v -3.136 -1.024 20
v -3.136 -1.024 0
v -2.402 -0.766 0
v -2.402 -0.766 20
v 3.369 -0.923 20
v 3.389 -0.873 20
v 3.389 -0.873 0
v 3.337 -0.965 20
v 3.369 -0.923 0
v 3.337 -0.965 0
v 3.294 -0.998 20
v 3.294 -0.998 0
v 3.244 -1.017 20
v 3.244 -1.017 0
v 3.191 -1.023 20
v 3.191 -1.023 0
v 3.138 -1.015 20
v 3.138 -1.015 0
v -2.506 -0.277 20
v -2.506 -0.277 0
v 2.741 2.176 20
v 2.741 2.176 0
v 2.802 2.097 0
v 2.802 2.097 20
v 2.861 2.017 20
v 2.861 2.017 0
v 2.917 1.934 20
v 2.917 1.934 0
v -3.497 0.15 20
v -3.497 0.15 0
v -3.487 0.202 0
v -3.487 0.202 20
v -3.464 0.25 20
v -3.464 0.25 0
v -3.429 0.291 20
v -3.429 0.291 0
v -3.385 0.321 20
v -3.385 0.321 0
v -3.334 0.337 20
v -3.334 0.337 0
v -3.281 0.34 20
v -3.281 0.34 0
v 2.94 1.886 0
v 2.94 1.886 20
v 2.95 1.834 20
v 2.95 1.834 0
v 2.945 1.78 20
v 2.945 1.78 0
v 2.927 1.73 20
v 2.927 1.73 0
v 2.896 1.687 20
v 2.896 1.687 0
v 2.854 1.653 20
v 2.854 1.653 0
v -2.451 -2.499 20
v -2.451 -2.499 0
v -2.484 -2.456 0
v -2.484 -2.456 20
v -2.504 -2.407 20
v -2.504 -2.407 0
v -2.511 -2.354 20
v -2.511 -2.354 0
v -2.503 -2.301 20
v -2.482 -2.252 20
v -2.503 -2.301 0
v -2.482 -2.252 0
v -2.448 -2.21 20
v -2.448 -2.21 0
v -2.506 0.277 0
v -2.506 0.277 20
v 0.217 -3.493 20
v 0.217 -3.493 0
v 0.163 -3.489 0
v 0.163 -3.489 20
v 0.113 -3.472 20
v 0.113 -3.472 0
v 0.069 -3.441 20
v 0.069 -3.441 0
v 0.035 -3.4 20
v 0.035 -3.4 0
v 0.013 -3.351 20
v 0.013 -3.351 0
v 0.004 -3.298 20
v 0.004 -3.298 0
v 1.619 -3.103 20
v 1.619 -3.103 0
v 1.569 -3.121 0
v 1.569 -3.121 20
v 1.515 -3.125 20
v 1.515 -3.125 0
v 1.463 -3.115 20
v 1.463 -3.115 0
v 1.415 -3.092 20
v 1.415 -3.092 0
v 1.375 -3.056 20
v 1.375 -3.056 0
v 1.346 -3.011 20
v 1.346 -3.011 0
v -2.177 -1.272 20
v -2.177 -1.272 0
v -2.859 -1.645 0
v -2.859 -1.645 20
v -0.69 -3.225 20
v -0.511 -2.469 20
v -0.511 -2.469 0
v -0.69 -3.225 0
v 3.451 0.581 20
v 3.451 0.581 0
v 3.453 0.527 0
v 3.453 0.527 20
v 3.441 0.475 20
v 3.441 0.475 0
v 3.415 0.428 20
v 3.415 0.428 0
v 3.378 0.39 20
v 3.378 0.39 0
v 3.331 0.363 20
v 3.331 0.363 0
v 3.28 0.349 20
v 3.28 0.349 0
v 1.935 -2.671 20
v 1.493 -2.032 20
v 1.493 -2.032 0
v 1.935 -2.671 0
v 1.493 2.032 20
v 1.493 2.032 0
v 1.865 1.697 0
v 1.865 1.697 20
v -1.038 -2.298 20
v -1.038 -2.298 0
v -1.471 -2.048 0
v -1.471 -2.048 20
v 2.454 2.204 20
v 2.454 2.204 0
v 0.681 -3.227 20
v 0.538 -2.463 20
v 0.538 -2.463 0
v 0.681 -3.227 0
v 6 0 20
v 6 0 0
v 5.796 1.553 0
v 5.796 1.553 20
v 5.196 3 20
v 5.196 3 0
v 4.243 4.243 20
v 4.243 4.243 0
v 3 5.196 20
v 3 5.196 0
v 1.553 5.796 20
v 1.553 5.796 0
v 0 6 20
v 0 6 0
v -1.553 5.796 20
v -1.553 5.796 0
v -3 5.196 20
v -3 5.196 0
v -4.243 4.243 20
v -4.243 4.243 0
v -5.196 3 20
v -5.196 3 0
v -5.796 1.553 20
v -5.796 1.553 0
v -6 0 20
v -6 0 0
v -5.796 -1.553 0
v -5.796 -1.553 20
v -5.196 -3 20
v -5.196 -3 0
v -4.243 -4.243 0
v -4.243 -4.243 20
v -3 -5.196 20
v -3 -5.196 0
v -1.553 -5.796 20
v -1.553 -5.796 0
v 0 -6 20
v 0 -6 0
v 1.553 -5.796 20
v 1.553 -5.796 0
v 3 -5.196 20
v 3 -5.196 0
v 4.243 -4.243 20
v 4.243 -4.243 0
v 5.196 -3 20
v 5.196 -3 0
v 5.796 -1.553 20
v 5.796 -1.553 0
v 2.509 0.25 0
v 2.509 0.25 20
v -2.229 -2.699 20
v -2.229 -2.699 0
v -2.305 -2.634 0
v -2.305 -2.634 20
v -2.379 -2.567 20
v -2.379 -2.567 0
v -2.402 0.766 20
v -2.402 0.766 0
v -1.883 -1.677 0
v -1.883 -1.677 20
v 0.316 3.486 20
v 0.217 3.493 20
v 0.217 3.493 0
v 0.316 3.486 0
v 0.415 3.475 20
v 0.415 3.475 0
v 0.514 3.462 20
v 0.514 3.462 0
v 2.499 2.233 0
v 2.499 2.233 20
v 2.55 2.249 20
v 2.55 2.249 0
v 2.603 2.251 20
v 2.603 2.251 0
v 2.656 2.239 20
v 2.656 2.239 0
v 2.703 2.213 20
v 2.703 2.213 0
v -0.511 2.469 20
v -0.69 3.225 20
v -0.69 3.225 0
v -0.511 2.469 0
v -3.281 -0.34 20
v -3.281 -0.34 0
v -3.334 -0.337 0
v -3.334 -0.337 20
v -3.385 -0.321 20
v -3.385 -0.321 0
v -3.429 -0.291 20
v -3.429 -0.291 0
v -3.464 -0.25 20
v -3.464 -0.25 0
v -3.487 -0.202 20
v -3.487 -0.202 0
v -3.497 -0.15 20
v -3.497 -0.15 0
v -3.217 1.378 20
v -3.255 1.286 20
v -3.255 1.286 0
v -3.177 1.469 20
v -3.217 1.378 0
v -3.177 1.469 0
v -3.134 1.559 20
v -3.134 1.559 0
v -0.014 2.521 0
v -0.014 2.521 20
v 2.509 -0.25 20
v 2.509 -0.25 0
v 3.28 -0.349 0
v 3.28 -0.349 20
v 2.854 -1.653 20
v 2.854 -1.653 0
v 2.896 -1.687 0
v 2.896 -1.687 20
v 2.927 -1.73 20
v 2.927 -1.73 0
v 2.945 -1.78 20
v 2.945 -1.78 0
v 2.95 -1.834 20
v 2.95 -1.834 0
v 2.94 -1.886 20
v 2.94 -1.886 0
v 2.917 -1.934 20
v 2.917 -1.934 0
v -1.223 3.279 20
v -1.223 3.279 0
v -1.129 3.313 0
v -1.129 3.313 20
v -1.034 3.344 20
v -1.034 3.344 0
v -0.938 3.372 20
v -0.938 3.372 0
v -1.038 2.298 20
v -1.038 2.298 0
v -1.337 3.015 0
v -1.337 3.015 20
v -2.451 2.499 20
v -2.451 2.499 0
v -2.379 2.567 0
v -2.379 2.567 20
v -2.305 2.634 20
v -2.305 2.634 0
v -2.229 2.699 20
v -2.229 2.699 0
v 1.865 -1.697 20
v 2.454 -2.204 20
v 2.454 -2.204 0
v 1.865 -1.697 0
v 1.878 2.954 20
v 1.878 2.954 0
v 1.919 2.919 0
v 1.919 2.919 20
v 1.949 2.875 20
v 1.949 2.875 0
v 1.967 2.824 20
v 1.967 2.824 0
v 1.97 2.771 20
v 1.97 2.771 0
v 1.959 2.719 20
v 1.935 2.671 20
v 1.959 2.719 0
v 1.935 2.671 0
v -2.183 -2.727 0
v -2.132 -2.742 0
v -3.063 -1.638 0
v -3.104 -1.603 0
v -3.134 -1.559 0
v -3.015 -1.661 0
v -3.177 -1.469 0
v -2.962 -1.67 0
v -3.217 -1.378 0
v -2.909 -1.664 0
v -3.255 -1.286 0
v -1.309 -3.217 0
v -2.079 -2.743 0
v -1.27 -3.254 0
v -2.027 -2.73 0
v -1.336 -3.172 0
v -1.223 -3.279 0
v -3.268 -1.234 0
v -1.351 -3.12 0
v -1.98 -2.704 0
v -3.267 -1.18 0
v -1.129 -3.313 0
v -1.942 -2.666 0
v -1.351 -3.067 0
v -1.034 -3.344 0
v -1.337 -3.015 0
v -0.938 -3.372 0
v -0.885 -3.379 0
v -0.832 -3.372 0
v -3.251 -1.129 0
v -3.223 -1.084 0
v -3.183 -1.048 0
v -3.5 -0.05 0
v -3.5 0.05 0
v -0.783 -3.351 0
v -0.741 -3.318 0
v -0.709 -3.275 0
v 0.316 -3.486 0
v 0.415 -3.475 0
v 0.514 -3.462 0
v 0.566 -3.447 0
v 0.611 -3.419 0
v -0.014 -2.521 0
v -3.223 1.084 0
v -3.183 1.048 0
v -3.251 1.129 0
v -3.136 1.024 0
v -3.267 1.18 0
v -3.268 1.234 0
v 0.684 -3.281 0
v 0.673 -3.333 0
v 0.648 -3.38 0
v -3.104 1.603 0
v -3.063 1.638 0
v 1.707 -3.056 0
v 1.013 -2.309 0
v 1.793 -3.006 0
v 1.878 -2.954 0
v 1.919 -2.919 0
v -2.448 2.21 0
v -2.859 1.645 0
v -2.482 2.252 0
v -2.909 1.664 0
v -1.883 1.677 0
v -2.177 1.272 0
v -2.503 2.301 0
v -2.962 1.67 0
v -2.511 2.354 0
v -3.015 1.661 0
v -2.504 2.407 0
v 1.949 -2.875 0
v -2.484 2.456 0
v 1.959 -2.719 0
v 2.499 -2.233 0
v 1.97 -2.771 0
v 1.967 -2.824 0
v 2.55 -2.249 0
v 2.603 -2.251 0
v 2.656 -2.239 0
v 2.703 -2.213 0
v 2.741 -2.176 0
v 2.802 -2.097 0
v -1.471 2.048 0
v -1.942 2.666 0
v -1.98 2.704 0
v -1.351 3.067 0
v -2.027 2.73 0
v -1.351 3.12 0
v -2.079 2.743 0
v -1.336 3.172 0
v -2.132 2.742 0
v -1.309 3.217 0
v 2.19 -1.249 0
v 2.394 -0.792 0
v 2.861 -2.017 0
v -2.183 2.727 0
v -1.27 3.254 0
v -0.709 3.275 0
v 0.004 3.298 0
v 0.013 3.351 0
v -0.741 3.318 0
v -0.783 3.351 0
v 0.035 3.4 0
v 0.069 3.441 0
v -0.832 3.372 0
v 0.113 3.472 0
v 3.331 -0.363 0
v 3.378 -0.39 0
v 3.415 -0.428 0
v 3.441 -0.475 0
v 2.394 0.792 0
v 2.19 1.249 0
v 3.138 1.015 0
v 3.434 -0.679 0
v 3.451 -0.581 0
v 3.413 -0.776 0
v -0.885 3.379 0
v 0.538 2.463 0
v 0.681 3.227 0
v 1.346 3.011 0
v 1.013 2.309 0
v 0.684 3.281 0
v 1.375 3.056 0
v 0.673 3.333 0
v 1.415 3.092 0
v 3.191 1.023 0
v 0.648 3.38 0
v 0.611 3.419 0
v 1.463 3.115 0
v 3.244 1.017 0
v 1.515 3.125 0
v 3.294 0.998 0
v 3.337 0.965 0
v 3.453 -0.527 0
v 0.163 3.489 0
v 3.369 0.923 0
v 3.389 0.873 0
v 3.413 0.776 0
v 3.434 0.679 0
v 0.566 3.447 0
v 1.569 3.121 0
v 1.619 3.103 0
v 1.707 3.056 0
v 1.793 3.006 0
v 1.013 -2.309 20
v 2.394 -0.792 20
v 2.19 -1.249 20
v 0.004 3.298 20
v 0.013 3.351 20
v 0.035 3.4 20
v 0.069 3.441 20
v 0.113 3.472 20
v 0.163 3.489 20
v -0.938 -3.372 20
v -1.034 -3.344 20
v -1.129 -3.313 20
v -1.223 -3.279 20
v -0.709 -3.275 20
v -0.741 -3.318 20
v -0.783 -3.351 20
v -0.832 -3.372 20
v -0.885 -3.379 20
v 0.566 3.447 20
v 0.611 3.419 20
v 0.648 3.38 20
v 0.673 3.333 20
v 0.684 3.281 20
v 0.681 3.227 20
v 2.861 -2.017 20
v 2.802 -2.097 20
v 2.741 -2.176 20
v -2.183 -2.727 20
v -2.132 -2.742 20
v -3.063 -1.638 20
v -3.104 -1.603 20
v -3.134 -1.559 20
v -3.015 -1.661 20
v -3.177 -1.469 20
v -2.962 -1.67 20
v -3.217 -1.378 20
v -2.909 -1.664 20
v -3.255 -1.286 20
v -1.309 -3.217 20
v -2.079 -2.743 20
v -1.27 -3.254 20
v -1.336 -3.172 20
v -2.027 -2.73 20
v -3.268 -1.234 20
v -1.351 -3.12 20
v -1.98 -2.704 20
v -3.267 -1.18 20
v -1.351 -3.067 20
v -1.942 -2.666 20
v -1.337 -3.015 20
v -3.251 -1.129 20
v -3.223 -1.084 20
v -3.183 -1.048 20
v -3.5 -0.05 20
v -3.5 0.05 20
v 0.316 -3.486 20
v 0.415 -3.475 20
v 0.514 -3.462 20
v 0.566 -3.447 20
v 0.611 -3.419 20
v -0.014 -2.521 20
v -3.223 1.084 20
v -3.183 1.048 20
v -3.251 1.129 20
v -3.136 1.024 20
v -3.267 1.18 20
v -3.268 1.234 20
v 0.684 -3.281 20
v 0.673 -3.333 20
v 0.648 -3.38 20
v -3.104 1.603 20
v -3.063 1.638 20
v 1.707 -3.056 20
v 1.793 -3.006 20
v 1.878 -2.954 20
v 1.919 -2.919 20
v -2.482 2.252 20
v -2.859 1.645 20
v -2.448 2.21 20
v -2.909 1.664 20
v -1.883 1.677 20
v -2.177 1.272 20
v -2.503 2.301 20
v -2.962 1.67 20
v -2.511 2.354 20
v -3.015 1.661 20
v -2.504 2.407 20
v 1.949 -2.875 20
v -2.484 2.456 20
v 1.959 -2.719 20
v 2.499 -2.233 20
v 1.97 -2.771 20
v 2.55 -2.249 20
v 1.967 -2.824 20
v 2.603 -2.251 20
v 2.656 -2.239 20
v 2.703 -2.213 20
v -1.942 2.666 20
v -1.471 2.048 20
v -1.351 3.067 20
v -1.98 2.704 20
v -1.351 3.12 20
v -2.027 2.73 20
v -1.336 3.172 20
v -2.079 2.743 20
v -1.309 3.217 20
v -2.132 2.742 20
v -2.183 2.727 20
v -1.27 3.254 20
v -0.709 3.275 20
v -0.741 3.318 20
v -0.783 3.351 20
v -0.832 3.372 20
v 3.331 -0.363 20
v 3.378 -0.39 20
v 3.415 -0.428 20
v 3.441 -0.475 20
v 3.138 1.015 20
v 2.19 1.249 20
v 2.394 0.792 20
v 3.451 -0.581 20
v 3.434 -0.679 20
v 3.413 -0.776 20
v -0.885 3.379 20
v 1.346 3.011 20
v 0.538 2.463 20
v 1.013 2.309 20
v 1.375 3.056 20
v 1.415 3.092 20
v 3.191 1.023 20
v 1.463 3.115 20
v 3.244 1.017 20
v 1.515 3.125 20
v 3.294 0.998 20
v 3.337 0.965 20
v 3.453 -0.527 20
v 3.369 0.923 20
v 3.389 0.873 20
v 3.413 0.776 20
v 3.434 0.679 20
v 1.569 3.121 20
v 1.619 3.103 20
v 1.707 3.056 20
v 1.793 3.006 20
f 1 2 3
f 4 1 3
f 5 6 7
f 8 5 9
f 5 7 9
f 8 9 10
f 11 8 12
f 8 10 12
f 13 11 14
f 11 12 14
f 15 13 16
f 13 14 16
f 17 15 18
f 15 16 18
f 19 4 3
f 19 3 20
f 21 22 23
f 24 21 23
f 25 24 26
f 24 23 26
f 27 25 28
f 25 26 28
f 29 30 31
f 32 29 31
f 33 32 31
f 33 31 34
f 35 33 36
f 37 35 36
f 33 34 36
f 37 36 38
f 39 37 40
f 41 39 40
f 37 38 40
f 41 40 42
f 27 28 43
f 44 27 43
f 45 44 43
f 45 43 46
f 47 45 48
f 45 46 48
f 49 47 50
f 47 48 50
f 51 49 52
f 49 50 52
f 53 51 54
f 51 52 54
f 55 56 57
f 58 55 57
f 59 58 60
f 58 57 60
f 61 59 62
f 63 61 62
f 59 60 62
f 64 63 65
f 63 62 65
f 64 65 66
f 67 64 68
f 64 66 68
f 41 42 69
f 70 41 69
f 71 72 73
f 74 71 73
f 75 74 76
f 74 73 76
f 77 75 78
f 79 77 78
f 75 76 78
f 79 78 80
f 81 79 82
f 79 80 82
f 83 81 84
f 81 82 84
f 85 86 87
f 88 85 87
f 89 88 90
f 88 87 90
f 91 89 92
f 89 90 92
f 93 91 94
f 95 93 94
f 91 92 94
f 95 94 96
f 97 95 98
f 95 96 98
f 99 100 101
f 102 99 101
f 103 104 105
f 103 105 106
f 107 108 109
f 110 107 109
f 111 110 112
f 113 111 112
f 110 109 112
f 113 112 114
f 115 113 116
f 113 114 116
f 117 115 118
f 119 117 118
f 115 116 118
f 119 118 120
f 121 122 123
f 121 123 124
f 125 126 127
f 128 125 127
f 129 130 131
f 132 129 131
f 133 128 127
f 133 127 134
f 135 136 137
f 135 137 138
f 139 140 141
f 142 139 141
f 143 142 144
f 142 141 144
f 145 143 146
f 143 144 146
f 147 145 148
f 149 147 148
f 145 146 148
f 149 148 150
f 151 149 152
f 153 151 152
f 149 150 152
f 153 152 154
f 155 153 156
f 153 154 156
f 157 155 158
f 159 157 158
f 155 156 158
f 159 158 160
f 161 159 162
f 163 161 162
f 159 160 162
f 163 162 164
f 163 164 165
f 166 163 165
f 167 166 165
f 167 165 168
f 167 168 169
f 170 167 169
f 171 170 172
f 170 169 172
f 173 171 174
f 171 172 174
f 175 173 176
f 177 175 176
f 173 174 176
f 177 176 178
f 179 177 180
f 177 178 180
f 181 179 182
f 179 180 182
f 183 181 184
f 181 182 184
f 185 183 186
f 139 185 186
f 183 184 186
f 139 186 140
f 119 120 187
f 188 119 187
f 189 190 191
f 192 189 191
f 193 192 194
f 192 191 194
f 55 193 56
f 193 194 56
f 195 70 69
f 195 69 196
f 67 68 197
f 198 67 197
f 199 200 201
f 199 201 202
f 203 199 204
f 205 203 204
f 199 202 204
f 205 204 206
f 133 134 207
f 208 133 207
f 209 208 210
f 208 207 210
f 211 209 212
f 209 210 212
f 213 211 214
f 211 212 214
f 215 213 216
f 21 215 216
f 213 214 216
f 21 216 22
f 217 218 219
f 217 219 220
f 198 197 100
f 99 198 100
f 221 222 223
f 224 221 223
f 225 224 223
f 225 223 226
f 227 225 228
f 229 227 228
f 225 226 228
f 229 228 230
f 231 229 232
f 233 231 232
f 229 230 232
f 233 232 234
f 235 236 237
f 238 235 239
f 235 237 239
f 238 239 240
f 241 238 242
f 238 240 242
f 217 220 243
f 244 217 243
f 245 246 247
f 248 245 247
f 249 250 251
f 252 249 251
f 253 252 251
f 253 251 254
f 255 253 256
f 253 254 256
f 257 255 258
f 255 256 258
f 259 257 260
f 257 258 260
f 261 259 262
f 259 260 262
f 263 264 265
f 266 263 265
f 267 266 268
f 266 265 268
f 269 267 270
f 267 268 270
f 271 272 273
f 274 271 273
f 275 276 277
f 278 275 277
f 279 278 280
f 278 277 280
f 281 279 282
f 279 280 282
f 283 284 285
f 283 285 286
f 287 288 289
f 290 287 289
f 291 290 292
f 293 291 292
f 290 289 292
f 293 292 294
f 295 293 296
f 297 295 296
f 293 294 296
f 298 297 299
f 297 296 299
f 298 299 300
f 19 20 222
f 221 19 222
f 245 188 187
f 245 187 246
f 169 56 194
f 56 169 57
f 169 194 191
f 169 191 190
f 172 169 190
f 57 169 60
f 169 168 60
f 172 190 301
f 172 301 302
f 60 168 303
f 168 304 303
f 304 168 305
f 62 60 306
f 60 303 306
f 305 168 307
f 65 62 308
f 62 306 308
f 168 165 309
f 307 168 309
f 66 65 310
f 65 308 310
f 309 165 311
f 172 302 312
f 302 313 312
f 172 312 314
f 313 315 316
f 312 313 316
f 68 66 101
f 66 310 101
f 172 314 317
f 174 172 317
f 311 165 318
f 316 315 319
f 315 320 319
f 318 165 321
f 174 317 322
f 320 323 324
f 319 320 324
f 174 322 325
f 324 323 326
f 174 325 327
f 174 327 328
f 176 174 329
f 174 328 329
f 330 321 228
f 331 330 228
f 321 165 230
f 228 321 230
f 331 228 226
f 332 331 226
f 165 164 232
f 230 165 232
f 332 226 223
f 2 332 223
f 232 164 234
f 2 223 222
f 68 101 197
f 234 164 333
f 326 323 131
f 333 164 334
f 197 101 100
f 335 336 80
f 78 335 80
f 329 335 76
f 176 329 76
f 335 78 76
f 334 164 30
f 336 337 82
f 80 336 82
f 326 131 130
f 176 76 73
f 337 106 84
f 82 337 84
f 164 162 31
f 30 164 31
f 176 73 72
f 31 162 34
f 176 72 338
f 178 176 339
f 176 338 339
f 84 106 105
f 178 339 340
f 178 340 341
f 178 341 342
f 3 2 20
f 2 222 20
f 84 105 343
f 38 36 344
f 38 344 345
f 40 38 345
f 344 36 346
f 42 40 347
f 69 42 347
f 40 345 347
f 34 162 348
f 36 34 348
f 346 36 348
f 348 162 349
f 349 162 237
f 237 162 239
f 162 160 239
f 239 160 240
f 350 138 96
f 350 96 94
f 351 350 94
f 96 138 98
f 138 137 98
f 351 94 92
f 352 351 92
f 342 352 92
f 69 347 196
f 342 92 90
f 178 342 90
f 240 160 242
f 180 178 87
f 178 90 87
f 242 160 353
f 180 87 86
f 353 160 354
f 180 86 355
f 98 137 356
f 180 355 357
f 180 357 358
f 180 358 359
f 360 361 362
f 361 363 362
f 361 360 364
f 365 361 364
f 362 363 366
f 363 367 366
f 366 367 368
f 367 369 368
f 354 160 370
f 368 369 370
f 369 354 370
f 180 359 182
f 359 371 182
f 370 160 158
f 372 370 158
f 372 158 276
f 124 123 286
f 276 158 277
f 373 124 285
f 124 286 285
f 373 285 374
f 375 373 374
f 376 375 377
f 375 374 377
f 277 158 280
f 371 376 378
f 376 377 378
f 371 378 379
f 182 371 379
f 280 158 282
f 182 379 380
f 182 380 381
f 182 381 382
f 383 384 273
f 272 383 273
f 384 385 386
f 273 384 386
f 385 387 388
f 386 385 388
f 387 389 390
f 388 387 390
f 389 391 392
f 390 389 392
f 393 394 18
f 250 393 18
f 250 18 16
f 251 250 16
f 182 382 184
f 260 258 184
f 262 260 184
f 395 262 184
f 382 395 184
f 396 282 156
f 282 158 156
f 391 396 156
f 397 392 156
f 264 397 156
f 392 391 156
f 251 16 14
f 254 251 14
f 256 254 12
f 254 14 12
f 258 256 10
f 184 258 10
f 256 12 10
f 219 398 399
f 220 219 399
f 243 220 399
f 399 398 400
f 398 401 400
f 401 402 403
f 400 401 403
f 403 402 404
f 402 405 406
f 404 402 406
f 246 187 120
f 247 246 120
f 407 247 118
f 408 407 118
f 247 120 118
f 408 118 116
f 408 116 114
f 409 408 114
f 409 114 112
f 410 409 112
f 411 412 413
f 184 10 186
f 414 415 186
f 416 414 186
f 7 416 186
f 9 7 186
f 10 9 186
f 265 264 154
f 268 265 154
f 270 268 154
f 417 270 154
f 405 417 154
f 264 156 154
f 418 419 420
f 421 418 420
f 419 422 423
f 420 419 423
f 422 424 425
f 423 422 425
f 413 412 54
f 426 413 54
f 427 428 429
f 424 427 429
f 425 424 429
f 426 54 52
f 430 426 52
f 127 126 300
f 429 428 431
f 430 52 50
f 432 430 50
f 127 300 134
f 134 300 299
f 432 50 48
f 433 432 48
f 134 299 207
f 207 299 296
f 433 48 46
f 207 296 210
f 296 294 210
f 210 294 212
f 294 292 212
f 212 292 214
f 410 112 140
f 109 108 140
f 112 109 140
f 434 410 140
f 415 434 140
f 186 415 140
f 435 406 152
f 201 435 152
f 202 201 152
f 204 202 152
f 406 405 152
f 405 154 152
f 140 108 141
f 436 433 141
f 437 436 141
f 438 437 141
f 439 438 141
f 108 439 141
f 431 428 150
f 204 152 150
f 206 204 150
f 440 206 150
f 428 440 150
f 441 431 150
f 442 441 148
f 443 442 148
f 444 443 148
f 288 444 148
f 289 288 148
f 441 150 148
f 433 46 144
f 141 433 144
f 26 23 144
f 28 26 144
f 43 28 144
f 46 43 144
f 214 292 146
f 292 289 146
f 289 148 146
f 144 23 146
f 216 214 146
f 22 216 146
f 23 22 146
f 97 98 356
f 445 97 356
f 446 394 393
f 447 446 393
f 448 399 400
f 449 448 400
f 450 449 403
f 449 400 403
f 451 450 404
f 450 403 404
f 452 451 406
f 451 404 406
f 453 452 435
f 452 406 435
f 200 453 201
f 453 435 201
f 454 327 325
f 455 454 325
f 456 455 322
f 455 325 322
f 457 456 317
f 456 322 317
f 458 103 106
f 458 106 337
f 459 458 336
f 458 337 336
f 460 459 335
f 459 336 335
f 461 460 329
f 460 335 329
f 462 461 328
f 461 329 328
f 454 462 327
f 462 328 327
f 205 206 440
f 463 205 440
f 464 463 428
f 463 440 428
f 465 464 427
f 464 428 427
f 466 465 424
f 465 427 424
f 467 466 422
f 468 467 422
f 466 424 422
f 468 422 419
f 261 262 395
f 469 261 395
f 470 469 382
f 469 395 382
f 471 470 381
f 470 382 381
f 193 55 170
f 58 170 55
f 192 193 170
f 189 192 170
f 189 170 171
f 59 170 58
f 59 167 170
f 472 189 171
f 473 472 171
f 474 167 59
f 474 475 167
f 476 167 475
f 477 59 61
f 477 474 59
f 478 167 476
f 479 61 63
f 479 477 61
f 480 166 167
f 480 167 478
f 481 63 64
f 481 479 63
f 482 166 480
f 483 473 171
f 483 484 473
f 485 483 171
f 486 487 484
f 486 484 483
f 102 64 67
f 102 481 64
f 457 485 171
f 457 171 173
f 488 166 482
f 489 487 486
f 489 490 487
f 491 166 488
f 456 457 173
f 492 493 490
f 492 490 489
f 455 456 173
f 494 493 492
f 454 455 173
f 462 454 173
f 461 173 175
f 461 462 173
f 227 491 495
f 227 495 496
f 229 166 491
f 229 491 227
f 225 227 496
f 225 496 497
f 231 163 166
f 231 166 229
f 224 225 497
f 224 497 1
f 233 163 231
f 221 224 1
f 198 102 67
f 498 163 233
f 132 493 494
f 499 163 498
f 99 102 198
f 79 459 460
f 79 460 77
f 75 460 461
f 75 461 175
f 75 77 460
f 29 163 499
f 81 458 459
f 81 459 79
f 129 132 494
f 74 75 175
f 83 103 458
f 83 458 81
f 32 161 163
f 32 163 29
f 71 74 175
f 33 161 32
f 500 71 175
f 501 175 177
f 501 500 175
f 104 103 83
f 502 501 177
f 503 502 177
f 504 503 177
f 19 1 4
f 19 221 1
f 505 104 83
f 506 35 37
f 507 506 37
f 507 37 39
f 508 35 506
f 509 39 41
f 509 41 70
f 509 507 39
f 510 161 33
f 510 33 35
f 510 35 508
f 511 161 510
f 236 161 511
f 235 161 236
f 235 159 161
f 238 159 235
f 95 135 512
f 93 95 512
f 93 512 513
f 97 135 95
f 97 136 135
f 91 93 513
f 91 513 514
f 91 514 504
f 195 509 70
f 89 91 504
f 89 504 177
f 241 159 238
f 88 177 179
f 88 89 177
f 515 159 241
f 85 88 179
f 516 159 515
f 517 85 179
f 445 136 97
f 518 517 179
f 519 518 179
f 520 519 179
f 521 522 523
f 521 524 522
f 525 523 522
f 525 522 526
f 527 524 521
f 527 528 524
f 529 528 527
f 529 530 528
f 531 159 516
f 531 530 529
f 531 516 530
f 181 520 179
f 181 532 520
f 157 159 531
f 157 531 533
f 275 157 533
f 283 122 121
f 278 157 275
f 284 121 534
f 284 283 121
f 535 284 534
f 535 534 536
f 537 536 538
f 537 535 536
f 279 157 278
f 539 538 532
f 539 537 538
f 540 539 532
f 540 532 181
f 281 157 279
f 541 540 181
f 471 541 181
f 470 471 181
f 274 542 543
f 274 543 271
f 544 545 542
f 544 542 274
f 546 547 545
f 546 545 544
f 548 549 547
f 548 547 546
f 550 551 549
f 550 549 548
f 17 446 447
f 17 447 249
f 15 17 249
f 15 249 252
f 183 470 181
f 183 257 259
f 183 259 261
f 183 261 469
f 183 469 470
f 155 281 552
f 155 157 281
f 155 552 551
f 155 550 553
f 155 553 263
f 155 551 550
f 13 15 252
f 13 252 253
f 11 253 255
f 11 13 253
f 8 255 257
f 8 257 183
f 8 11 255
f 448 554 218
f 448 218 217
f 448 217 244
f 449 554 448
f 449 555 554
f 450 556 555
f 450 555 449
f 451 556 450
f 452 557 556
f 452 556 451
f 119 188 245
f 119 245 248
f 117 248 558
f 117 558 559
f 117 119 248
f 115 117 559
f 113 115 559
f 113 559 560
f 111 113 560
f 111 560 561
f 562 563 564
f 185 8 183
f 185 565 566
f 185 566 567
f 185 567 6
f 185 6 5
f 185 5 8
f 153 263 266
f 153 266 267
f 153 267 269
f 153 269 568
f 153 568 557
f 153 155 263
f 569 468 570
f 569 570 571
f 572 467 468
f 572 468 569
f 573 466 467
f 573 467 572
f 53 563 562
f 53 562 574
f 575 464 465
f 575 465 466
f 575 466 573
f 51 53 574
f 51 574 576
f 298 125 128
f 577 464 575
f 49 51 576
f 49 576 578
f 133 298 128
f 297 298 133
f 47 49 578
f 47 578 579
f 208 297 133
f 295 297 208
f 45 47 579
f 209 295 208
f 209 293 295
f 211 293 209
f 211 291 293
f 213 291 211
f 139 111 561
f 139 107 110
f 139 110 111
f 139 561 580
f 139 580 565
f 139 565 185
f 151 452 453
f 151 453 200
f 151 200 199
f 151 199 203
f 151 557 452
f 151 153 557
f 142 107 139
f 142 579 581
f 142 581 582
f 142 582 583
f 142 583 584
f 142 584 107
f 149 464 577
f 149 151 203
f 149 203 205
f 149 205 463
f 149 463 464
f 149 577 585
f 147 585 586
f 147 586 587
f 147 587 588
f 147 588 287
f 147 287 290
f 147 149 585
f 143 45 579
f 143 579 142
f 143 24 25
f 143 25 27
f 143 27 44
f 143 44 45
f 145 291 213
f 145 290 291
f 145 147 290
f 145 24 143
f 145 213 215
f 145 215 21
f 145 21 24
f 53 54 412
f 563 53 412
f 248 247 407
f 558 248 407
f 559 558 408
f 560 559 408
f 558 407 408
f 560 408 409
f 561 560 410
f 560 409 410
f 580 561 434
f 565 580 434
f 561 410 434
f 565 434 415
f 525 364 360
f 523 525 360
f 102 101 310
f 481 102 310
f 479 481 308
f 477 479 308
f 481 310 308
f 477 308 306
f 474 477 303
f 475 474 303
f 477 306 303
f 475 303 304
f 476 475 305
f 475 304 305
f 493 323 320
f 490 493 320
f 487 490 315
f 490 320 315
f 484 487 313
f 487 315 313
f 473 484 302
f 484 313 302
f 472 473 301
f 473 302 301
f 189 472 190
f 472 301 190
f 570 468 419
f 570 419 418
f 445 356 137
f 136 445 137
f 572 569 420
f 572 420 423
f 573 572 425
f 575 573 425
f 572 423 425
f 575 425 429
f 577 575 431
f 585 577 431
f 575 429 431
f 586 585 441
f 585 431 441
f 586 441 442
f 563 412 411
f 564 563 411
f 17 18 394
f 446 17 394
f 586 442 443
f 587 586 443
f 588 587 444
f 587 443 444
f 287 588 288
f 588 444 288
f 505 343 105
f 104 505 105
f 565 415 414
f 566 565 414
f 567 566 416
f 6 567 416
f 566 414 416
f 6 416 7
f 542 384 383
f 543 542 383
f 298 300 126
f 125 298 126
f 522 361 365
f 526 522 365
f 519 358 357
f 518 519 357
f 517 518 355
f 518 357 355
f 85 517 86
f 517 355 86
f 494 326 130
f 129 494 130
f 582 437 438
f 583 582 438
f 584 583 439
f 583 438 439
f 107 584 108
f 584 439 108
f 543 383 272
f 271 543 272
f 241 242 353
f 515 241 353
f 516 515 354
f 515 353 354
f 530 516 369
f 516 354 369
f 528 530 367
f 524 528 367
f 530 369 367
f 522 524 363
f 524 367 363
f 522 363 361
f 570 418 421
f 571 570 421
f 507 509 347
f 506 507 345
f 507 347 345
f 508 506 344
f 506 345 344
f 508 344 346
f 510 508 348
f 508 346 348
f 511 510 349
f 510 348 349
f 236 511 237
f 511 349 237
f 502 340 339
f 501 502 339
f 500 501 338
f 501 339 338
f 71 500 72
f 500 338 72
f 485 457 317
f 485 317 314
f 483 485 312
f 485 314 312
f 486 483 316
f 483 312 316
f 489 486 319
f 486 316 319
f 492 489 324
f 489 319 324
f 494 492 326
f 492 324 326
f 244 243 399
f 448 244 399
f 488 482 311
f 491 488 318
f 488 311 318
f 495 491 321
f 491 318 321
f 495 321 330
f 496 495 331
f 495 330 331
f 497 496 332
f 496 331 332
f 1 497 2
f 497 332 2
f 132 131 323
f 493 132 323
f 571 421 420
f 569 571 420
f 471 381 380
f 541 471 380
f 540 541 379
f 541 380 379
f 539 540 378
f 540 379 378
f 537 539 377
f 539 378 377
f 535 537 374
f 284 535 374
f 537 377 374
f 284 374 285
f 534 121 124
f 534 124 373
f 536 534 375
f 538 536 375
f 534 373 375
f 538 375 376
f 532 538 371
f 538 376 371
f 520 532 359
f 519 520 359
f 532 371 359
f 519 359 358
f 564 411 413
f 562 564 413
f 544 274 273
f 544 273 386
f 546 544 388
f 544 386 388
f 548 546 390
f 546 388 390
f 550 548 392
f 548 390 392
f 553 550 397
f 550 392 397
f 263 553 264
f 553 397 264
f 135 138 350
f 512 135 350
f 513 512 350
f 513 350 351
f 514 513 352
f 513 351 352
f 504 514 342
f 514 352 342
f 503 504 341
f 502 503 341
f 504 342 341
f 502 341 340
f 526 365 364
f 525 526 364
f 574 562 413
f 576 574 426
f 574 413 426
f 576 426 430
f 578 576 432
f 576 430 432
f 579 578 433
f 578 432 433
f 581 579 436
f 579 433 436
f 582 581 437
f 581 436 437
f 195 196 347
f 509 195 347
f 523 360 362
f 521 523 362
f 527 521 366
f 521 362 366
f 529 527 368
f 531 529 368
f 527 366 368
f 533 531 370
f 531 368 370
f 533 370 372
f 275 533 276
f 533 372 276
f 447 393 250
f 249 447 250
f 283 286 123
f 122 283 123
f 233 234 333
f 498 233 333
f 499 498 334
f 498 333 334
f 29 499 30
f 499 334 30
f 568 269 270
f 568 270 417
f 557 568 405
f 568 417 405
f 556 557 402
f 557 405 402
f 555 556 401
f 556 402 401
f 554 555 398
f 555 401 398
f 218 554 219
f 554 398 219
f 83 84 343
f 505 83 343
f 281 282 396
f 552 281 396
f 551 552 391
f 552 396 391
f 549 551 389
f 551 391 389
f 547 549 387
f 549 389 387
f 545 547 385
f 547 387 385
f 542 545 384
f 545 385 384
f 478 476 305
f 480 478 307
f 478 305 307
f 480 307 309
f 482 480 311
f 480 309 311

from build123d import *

# Parameters (mm, degrees)
F0_R     = 6
F1_DEPTH = 20


with BuildPart() as f1:
    # F0 (on Top) → F1 (new body)
    with BuildSketch(Plane.XY):
        Circle(F0_R)
        with BuildLine():
            Line((3.279786, 0.349242), (2.50894, 0.25))
            Line((2.50894, 0.25), (2.50894, -0.25))
            Line((2.50894, -0.25), (3.279786, -0.349242))
            ThreePointArc((3.279786, -0.349242), (3.414903, -0.428484), (3.451475, -0.580793))
            ThreePointArc((3.451475, -0.580793), (3.423517, -0.727691), (3.389309, -0.87326))
            ThreePointArc((3.389309, -0.87326), (3.293949, -0.997527), (3.138283, -1.01496))
            Line((3.138283, -1.01496), (2.393715, -0.792091))
            Line((2.393715, -0.792091), (2.190347, -1.248864))
            Line((2.190347, -1.248864), (2.854184, -1.653058))
            ThreePointArc((2.854184, -1.653058), (2.945389, -1.780405), (2.916849, -1.934423))
            ThreePointArc((2.916849, -1.934423), (2.831559, -2.057248), (2.741101, -2.176319))
            ThreePointArc((2.741101, -2.176319), (2.603441, -2.251056), (2.454143, -2.203667))
            Line((2.454143, -2.203667), (1.864595, -1.697223))
            Line((1.864595, -1.697223), (1.493022, -2.031788))
            Line((1.493022, -2.031788), (1.935067, -2.671045))
            ThreePointArc((1.935067, -2.671045), (1.966591, -2.824479), (1.877874, -2.953572))
            ThreePointArc((1.877874, -2.953572), (1.75, -3.031089), (1.618932, -3.103073))
            ThreePointArc((1.618932, -3.103073), (1.462775, -3.115357), (1.345659, -3.01134))
            Line((1.345659, -3.01134), (1.013069, -2.308889))
            Line((1.013069, -2.308889), (0.537541, -2.463398))
            Line((0.537541, -2.463398), (0.68136, -3.227184))
            ThreePointArc((0.68136, -3.227184), (0.647751, -3.380174), (0.514197, -3.462023))
            ThreePointArc((0.514197, -3.462023), (0.36585, -3.480827), (0.216834, -3.493277))
            ThreePointArc((0.216834, -3.493277), (0.069182, -3.440984), (0.004498, -3.298325))
            Line((0.004498, -3.298325), (-0.013625, -2.521328))
            Line((-0.013625, -2.521328), (-0.510886, -2.469064))
            Line((-0.510886, -2.469064), (-0.69016, -3.225313))
            ThreePointArc((-0.69016, -3.225313), (-0.783091, -3.351407), (-0.938389, -3.371858))
            ThreePointArc((-0.938389, -3.371858), (-1.081559, -3.328698), (-1.222756, -3.279462))
            ThreePointArc((-1.222756, -3.279462), (-1.336374, -3.171634), (-1.33744, -3.014999))
            Line((-1.33744, -3.014999), (-1.037964, -2.297806))
            Line((-1.037964, -2.297806), (-1.470976, -2.047806))
            Line((-1.470976, -2.047806), (-1.942346, -2.665757))
            ThreePointArc((-1.942346, -2.665757), (-2.078529, -2.743151), (-2.228719, -2.698668))
            ThreePointArc((-2.228719, -2.698668), (-2.341957, -2.601007), (-2.45092, -2.498598))
            ThreePointArc((-2.45092, -2.498598), (-2.510858, -2.35388), (-2.448123, -2.210353))
            Line((-2.448123, -2.210353), (-1.882829, -1.676972))
            Line((-1.882829, -1.676972), (-2.176721, -1.272464))
            Line((-2.176721, -1.272464), (-2.858682, -1.645267))
            ThreePointArc((-2.858682, -1.645267), (-3.014571, -1.660579), (-3.133684, -1.558854))
            ThreePointArc((-3.133684, -1.558854), (-3.197409, -1.423578), (-3.255298, -1.285704))
            ThreePointArc((-3.255298, -1.285704), (-3.251192, -1.129119), (-3.135503, -1.023516))
            Line((-3.135503, -1.023516), (-2.402136, -0.766175))
            Line((-2.402136, -0.766175), (-2.506092, -0.277101))
            Line((-2.506092, -0.277101), (-3.280726, -0.340295))
            ThreePointArc((-3.280726, -0.340295), (-3.429366, -0.290878), (-3.496806, -0.1495))
            ThreePointArc((-3.496806, -0.1495), (-3.5, 0), (-3.496806, 0.1495))
            ThreePointArc((-3.496806, 0.1495), (-3.429366, 0.290878), (-3.280726, 0.340295))
            Line((-3.280726, 0.340295), (-2.506092, 0.277101))
            Line((-2.506092, 0.277101), (-2.402136, 0.766175))
            Line((-2.402136, 0.766175), (-3.135503, 1.023516))
            ThreePointArc((-3.135503, 1.023516), (-3.251192, 1.129119), (-3.255298, 1.285704))
            ThreePointArc((-3.255298, 1.285704), (-3.197409, 1.423578), (-3.133684, 1.558854))
            ThreePointArc((-3.133684, 1.558854), (-3.014571, 1.660579), (-2.858682, 1.645267))
            Line((-2.858682, 1.645267), (-2.176721, 1.272464))
            Line((-2.176721, 1.272464), (-1.882829, 1.676972))
            Line((-1.882829, 1.676972), (-2.448123, 2.210353))
            ThreePointArc((-2.448123, 2.210353), (-2.510858, 2.35388), (-2.45092, 2.498598))
            ThreePointArc((-2.45092, 2.498598), (-2.341957, 2.601007), (-2.228719, 2.698668))
            ThreePointArc((-2.228719, 2.698668), (-2.078529, 2.743151), (-1.942346, 2.665757))
            Line((-1.942346, 2.665757), (-1.470976, 2.047806))
            Line((-1.470976, 2.047806), (-1.037964, 2.297806))
            Line((-1.037964, 2.297806), (-1.33744, 3.014999))
            ThreePointArc((-1.33744, 3.014999), (-1.336374, 3.171634), (-1.222756, 3.279462))
            ThreePointArc((-1.222756, 3.279462), (-1.081559, 3.328698), (-0.938389, 3.371858))
            ThreePointArc((-0.938389, 3.371858), (-0.783091, 3.351407), (-0.69016, 3.225313))
            Line((-0.69016, 3.225313), (-0.510886, 2.469064))
            Line((-0.510886, 2.469064), (-0.013625, 2.521328))
            Line((-0.013625, 2.521328), (0.004498, 3.298325))
            ThreePointArc((0.004498, 3.298325), (0.069182, 3.440984), (0.216834, 3.493277))
            ThreePointArc((0.216834, 3.493277), (0.36585, 3.480827), (0.514197, 3.462023))
            ThreePointArc((0.514197, 3.462023), (0.647751, 3.380174), (0.68136, 3.227184))
            Line((0.68136, 3.227184), (0.537541, 2.463398))
            Line((0.537541, 2.463398), (1.013069, 2.308889))
            Line((1.013069, 2.308889), (1.345659, 3.01134))
            ThreePointArc((1.345659, 3.01134), (1.462775, 3.115357), (1.618932, 3.103073))
            ThreePointArc((1.618932, 3.103073), (1.75, 3.031089), (1.877874, 2.953572))
            ThreePointArc((1.877874, 2.953572), (1.966591, 2.824479), (1.935067, 2.671045))
            Line((1.935067, 2.671045), (1.493022, 2.031788))
            Line((1.493022, 2.031788), (1.864595, 1.697223))
            Line((1.864595, 1.697223), (2.454143, 2.203667))
            ThreePointArc((2.454143, 2.203667), (2.603441, 2.251056), (2.741101, 2.176319))
            ThreePointArc((2.741101, 2.176319), (2.831559, 2.057248), (2.916849, 1.934423))
            ThreePointArc((2.916849, 1.934423), (2.945389, 1.780405), (2.854184, 1.653058))
            Line((2.854184, 1.653058), (2.190347, 1.248864))
            Line((2.190347, 1.248864), (2.393715, 0.792091))
            Line((2.393715, 0.792091), (3.138283, 1.01496))
            ThreePointArc((3.138283, 1.01496), (3.293949, 0.997527), (3.389309, 0.87326))
            ThreePointArc((3.389309, 0.87326), (3.423517, 0.727691), (3.451475, 0.580793))
            ThreePointArc((3.451475, 0.580793), (3.414903, 0.428484), (3.279786, 0.349242))
        make_face(mode=Mode.SUBTRACT)
    extrude(amount=F1_DEPTH)


solid = f1.part
